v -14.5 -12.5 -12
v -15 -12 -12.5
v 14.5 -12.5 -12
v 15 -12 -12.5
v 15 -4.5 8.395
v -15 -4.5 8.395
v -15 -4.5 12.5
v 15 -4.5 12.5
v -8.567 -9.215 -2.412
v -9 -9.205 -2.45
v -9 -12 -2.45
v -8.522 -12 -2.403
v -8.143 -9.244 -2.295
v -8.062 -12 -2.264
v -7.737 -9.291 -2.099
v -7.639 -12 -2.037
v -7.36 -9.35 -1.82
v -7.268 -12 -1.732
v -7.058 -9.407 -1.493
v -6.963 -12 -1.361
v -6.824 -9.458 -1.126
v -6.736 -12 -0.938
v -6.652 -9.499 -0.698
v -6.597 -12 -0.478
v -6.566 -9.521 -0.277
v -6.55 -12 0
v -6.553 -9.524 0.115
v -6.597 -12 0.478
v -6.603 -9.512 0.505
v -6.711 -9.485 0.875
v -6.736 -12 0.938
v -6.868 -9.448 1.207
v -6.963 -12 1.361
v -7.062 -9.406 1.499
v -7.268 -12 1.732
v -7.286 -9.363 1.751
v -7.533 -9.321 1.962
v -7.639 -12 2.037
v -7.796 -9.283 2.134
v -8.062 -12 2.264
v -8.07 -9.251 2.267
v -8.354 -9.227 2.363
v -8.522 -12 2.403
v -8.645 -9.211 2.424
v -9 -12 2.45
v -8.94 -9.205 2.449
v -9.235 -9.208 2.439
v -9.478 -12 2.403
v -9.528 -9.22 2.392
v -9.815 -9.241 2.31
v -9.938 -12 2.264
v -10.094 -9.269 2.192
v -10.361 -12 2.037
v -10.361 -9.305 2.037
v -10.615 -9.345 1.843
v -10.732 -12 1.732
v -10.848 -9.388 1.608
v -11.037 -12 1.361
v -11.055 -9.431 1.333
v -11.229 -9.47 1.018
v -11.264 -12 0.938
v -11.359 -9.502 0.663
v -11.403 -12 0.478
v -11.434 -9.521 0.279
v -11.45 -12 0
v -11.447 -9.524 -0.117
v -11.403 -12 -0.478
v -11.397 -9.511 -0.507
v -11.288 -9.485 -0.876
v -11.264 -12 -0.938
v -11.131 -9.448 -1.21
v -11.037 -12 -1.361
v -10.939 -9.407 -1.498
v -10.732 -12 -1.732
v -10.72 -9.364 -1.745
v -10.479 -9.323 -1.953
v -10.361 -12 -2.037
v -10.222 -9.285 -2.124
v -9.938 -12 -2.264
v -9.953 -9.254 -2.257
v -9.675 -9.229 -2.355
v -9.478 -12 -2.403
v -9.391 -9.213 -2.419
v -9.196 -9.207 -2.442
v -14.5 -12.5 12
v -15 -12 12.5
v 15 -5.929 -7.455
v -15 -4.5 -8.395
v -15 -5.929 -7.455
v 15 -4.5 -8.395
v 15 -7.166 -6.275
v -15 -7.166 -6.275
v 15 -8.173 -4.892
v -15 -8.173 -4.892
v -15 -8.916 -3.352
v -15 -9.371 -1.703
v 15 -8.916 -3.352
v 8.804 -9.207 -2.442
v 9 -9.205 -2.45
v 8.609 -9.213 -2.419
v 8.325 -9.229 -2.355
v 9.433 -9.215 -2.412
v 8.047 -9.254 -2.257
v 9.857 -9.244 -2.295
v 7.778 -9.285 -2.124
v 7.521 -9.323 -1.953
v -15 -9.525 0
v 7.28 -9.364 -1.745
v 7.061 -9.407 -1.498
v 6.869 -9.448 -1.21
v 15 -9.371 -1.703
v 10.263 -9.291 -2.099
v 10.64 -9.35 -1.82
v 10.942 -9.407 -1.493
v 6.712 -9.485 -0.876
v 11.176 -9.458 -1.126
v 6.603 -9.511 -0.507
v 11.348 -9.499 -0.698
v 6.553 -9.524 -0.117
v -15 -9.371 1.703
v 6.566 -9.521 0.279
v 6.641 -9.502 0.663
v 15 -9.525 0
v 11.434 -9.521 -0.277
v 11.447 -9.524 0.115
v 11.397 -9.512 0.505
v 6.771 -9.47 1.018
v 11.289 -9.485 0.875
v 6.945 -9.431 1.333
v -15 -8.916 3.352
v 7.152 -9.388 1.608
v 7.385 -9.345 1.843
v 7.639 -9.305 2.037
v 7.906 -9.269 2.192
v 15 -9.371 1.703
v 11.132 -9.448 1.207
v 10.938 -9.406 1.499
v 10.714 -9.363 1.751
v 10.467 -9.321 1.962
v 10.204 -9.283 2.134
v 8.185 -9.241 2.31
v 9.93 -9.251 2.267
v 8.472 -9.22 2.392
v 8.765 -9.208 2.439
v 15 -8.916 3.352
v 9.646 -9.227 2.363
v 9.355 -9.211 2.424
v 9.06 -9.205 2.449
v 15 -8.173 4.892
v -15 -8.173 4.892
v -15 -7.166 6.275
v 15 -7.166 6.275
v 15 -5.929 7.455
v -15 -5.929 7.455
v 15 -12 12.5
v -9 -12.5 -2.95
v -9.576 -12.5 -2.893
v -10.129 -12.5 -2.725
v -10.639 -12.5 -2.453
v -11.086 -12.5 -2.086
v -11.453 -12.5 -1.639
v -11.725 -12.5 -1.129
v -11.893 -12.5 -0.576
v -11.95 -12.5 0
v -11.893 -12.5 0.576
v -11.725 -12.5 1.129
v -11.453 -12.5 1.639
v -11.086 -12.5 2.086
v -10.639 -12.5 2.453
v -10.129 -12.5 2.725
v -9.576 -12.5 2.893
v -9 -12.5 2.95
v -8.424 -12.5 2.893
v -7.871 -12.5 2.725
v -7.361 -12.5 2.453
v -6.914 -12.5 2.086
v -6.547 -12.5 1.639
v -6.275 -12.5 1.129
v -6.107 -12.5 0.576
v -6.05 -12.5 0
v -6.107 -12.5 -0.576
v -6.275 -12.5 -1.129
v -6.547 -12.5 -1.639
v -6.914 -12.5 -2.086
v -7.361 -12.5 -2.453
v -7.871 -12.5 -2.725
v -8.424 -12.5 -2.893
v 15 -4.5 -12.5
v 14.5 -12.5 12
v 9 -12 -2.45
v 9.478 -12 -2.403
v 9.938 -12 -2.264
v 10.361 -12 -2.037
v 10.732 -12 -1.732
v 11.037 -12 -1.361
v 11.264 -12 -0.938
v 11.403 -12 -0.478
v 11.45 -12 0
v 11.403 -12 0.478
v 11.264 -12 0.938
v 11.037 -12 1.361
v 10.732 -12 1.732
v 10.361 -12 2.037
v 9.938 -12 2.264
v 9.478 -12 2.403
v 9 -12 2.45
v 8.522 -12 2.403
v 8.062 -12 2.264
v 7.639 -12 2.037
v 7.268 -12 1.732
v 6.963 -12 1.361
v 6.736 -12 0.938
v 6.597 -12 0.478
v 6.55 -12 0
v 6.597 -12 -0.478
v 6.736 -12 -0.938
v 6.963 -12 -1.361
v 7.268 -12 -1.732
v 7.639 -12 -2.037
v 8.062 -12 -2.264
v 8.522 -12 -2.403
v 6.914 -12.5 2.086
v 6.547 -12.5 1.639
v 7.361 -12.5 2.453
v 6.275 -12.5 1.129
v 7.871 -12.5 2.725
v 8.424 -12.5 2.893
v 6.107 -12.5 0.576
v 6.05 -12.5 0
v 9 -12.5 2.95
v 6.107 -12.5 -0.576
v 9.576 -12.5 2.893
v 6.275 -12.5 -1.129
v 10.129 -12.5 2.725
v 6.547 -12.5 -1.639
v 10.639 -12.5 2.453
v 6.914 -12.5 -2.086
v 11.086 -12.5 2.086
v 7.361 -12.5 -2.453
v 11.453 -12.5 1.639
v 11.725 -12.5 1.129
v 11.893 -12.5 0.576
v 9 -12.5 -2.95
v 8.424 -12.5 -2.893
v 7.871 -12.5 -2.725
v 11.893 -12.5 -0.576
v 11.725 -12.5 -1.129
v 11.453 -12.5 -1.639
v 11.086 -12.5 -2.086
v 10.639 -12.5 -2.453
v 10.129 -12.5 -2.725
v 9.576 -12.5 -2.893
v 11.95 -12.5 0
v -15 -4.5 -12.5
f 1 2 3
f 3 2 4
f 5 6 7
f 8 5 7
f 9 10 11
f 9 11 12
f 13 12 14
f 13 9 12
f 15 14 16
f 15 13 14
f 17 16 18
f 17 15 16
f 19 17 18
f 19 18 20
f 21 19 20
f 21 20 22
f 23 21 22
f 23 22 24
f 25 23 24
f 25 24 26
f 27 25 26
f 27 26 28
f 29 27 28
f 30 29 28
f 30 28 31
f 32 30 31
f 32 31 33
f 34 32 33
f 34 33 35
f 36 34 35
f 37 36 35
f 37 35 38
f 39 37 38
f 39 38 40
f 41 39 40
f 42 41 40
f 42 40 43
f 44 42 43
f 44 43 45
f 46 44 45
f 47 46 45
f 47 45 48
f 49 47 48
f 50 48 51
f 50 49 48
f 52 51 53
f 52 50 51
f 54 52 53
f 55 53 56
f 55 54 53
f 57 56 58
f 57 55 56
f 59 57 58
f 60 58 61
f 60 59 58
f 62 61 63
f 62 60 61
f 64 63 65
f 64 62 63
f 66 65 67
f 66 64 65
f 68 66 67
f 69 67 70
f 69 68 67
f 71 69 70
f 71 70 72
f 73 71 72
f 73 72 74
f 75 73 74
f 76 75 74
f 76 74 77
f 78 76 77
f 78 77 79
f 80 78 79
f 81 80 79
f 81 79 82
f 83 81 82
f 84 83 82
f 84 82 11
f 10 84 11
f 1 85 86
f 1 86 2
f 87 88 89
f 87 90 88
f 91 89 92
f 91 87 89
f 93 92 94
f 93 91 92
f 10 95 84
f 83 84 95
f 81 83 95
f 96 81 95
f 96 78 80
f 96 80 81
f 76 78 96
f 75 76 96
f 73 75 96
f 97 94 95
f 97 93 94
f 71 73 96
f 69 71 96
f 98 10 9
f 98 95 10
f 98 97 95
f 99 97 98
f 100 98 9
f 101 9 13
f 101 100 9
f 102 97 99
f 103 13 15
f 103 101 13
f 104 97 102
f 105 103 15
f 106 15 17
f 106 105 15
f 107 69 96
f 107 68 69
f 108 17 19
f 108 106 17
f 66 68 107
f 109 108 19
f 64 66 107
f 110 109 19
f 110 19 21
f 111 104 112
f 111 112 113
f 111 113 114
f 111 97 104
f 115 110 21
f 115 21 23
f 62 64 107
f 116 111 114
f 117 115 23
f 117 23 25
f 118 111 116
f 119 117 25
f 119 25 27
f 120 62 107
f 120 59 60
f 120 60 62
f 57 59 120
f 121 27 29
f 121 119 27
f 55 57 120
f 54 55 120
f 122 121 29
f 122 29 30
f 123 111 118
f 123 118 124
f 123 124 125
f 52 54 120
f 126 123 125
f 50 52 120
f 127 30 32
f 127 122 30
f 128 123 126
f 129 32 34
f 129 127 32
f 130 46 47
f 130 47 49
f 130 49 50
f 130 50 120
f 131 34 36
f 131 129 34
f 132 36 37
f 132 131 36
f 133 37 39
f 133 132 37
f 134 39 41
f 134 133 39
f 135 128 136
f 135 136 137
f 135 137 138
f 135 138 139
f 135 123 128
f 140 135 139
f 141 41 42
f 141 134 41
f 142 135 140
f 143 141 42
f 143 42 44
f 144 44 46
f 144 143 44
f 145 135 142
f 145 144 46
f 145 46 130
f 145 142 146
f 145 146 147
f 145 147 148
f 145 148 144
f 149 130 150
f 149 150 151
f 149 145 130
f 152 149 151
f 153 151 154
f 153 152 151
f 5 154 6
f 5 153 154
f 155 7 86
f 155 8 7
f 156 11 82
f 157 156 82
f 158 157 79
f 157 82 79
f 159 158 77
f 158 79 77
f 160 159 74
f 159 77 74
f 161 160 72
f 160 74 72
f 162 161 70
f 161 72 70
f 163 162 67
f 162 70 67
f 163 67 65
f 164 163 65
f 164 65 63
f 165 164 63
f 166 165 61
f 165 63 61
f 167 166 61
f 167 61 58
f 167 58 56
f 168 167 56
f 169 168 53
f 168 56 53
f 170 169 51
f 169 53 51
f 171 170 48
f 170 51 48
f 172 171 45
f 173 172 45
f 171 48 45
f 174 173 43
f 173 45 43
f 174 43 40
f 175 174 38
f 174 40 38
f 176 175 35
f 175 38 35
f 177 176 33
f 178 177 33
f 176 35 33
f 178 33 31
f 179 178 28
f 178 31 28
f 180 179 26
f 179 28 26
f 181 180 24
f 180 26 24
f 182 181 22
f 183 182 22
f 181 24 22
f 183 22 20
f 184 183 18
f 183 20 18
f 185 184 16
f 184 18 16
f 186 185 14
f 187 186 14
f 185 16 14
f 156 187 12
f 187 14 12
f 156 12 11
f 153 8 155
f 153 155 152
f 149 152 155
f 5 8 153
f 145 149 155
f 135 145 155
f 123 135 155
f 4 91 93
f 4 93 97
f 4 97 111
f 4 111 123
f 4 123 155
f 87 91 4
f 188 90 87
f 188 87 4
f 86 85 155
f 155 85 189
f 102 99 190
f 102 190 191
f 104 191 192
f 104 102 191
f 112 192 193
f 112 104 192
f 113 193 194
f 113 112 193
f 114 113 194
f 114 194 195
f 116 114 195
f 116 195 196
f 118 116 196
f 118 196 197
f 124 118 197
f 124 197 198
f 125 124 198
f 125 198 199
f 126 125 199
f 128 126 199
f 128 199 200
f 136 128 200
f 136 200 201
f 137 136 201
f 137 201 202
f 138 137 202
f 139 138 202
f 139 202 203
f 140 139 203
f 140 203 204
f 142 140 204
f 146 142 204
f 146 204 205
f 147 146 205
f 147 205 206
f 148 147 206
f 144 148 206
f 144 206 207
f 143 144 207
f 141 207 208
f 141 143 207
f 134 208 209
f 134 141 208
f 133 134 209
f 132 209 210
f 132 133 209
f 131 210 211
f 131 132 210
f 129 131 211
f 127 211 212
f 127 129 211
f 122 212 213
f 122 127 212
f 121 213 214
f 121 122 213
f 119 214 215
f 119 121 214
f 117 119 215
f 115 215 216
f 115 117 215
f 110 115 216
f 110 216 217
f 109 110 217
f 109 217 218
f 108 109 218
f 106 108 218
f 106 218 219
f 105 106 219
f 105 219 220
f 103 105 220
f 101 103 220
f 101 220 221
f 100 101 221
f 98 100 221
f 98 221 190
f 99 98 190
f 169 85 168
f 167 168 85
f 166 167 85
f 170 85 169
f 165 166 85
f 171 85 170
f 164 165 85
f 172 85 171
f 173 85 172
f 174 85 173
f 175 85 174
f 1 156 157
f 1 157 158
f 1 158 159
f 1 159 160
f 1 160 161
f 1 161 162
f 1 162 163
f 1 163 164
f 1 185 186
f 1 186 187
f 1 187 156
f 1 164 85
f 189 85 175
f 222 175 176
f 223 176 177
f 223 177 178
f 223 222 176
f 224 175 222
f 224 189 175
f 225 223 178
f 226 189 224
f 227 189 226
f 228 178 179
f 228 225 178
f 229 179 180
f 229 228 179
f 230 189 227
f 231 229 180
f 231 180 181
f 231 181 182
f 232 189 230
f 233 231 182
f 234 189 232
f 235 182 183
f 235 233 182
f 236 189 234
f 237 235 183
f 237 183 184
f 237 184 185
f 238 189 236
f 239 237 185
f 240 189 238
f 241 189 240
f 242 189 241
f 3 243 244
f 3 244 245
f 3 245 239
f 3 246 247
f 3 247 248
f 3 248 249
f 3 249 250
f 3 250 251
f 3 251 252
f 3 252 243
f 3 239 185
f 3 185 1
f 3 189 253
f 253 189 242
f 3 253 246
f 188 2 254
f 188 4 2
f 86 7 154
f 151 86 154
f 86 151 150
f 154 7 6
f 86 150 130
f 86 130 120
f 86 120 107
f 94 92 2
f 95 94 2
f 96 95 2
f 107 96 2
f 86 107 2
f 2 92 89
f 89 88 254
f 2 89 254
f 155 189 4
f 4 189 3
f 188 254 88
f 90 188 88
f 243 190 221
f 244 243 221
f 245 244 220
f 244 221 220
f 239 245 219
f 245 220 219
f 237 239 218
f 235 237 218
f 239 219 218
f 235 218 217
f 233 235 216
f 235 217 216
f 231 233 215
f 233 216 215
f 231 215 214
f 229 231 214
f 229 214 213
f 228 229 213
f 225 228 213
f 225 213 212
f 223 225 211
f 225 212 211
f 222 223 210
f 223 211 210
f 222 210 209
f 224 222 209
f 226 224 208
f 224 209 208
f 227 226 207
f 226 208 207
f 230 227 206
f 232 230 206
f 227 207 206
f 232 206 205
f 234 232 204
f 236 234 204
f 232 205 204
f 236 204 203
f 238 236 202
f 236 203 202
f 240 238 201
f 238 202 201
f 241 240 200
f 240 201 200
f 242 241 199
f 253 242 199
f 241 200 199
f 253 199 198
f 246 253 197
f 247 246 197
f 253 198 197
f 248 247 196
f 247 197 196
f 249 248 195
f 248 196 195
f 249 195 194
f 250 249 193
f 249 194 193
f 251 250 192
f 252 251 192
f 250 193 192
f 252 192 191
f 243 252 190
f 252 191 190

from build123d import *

# Parameters (mm, degrees)
BOSS_EXTRUDE1_DEPTH     = 15
CUT_EXTRUDE1_DEPTH      = 22.100947846
CUT_EXTRUDE1_DEPTH_BACK = 22.100947846
SKETCH2_R               = 2.45
CHAMFER1_SIZE           = 0.5


with BuildPart() as part:
    # Sketch1 → Boss-Extrude1 (new, symmetric)
    with BuildSketch(Plane(origin=(0, 0, 0), x_dir=(0, 0, -1), z_dir=(1, 0, 0))):
        with BuildLine():
            Line((-8.394976176, -4.5), (-12.5, -4.5))
            Line((-12.5, -4.5), (-12.5, -12.5))
            Line((-12.5, -12.5), (12.5, -12.5))
            Line((12.5, -12.5), (12.5, -4.5))
            Line((12.5, -4.5), (8.394976176, -4.5))
            ThreePointArc((8.394976176, -4.5), (0, -9.525), (-8.394976176, -4.5))
        make_face()
    extrude(amount=BOSS_EXTRUDE1_DEPTH, both=True)

    # Sketch2 → Cut-Extrude1 (cut, two sides: drawn at the far end of the back side and taken through both)
    with BuildSketch(Plane.XZ.offset(12.5).offset(-CUT_EXTRUDE1_DEPTH_BACK)):
        with Locations(Location((9, 0, 0), (0, 0, 270))):
            Circle(SKETCH2_R)
        with Locations(Location((-9, 0, 0), (0, 0, 270))):
            Circle(SKETCH2_R)
    extrude(amount=CUT_EXTRUDE1_DEPTH + CUT_EXTRUDE1_DEPTH_BACK, mode=Mode.SUBTRACT)

    # Chamfer1
    chamfer1_edges = [part.edges().sort_by_distance(p)[0] for p in [
        (0, -12.5, -12.5),
        (0, -12.5, 12.5),
        (15, -12.5, 0),
        (-9, -12.5, 2.45),
        (9, -12.5, 2.45),
        (-15, -12.5, 0),
    ]]
    chamfer(chamfer1_edges, length=CHAMFER1_SIZE)


solid = part.part
